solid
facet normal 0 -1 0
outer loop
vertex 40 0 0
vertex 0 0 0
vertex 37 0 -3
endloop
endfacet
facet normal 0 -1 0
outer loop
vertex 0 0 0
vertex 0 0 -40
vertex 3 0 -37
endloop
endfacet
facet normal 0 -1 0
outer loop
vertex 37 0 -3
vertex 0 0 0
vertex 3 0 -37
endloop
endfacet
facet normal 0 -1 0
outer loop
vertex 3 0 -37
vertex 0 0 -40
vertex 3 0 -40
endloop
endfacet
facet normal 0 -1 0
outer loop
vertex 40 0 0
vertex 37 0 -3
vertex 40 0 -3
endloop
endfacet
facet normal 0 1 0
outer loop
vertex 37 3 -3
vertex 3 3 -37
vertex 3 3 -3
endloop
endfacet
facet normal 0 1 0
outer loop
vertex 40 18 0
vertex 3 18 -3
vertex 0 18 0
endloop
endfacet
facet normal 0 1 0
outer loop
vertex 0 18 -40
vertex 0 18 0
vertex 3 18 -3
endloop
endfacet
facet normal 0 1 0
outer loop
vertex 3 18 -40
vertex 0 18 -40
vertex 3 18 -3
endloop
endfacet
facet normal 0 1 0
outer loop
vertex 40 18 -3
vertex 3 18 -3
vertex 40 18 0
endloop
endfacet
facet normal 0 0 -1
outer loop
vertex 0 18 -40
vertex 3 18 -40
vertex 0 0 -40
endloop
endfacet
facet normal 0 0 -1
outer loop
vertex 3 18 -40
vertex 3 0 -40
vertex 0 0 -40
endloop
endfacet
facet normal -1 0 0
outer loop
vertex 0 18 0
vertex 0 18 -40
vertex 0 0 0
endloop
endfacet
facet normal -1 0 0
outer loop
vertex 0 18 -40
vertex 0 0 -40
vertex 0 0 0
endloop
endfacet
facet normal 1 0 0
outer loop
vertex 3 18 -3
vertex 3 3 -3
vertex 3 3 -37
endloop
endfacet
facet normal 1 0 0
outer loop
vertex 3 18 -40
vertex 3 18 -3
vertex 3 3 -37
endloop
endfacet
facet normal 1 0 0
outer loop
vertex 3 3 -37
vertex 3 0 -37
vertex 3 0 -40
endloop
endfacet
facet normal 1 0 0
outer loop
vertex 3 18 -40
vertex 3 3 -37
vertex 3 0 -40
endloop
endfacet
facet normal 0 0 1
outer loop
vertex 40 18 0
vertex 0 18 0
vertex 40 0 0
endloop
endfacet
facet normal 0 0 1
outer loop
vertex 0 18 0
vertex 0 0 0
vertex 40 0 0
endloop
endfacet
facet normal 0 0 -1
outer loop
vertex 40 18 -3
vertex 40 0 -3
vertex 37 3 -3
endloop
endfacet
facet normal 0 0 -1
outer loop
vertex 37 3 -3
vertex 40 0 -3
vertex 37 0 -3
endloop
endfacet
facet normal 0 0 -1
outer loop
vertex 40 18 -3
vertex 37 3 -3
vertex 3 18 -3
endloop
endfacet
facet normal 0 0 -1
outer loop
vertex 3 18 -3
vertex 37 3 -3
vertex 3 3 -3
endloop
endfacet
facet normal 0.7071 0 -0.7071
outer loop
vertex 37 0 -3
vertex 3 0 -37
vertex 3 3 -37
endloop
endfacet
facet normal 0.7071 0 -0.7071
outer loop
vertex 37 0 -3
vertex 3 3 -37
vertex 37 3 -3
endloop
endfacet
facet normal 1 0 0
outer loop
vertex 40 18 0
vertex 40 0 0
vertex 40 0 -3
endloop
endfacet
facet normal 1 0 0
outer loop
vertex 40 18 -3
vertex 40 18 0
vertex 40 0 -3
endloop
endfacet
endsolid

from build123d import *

# Parameters (mm, degrees)
EXTRUDE_1_DEPTH = 3
EXTRUDE_2_DEPTH = 15


with BuildPart() as part:
    # 草图1 → 凸台-拉伸1 (new body)
    with BuildSketch(Plane(origin=(0, 0, 0), x_dir=(1, 0, 0), z_dir=(0, 1, 0))):
        Polygon((3, 40), (0, 40), (3, 37), align=None)
        Polygon((0, 40), (40, 0), (0, 0), align=None)
        Polygon((37, 3), (40, 0), (40, 3), align=None)
    extrude(amount=EXTRUDE_1_DEPTH)

    # 草图2 → 凸台-拉伸2 (add)
    with BuildSketch(Plane(origin=(0, 3, 0), x_dir=(1, 0, 0), z_dir=(0, 1, 0))):
        Polygon((3, 3), (3, 40), (0, 40), (0, 0), (40, 0), (40, 3), align=None)
    extrude(amount=EXTRUDE_2_DEPTH)


solid = part.part
